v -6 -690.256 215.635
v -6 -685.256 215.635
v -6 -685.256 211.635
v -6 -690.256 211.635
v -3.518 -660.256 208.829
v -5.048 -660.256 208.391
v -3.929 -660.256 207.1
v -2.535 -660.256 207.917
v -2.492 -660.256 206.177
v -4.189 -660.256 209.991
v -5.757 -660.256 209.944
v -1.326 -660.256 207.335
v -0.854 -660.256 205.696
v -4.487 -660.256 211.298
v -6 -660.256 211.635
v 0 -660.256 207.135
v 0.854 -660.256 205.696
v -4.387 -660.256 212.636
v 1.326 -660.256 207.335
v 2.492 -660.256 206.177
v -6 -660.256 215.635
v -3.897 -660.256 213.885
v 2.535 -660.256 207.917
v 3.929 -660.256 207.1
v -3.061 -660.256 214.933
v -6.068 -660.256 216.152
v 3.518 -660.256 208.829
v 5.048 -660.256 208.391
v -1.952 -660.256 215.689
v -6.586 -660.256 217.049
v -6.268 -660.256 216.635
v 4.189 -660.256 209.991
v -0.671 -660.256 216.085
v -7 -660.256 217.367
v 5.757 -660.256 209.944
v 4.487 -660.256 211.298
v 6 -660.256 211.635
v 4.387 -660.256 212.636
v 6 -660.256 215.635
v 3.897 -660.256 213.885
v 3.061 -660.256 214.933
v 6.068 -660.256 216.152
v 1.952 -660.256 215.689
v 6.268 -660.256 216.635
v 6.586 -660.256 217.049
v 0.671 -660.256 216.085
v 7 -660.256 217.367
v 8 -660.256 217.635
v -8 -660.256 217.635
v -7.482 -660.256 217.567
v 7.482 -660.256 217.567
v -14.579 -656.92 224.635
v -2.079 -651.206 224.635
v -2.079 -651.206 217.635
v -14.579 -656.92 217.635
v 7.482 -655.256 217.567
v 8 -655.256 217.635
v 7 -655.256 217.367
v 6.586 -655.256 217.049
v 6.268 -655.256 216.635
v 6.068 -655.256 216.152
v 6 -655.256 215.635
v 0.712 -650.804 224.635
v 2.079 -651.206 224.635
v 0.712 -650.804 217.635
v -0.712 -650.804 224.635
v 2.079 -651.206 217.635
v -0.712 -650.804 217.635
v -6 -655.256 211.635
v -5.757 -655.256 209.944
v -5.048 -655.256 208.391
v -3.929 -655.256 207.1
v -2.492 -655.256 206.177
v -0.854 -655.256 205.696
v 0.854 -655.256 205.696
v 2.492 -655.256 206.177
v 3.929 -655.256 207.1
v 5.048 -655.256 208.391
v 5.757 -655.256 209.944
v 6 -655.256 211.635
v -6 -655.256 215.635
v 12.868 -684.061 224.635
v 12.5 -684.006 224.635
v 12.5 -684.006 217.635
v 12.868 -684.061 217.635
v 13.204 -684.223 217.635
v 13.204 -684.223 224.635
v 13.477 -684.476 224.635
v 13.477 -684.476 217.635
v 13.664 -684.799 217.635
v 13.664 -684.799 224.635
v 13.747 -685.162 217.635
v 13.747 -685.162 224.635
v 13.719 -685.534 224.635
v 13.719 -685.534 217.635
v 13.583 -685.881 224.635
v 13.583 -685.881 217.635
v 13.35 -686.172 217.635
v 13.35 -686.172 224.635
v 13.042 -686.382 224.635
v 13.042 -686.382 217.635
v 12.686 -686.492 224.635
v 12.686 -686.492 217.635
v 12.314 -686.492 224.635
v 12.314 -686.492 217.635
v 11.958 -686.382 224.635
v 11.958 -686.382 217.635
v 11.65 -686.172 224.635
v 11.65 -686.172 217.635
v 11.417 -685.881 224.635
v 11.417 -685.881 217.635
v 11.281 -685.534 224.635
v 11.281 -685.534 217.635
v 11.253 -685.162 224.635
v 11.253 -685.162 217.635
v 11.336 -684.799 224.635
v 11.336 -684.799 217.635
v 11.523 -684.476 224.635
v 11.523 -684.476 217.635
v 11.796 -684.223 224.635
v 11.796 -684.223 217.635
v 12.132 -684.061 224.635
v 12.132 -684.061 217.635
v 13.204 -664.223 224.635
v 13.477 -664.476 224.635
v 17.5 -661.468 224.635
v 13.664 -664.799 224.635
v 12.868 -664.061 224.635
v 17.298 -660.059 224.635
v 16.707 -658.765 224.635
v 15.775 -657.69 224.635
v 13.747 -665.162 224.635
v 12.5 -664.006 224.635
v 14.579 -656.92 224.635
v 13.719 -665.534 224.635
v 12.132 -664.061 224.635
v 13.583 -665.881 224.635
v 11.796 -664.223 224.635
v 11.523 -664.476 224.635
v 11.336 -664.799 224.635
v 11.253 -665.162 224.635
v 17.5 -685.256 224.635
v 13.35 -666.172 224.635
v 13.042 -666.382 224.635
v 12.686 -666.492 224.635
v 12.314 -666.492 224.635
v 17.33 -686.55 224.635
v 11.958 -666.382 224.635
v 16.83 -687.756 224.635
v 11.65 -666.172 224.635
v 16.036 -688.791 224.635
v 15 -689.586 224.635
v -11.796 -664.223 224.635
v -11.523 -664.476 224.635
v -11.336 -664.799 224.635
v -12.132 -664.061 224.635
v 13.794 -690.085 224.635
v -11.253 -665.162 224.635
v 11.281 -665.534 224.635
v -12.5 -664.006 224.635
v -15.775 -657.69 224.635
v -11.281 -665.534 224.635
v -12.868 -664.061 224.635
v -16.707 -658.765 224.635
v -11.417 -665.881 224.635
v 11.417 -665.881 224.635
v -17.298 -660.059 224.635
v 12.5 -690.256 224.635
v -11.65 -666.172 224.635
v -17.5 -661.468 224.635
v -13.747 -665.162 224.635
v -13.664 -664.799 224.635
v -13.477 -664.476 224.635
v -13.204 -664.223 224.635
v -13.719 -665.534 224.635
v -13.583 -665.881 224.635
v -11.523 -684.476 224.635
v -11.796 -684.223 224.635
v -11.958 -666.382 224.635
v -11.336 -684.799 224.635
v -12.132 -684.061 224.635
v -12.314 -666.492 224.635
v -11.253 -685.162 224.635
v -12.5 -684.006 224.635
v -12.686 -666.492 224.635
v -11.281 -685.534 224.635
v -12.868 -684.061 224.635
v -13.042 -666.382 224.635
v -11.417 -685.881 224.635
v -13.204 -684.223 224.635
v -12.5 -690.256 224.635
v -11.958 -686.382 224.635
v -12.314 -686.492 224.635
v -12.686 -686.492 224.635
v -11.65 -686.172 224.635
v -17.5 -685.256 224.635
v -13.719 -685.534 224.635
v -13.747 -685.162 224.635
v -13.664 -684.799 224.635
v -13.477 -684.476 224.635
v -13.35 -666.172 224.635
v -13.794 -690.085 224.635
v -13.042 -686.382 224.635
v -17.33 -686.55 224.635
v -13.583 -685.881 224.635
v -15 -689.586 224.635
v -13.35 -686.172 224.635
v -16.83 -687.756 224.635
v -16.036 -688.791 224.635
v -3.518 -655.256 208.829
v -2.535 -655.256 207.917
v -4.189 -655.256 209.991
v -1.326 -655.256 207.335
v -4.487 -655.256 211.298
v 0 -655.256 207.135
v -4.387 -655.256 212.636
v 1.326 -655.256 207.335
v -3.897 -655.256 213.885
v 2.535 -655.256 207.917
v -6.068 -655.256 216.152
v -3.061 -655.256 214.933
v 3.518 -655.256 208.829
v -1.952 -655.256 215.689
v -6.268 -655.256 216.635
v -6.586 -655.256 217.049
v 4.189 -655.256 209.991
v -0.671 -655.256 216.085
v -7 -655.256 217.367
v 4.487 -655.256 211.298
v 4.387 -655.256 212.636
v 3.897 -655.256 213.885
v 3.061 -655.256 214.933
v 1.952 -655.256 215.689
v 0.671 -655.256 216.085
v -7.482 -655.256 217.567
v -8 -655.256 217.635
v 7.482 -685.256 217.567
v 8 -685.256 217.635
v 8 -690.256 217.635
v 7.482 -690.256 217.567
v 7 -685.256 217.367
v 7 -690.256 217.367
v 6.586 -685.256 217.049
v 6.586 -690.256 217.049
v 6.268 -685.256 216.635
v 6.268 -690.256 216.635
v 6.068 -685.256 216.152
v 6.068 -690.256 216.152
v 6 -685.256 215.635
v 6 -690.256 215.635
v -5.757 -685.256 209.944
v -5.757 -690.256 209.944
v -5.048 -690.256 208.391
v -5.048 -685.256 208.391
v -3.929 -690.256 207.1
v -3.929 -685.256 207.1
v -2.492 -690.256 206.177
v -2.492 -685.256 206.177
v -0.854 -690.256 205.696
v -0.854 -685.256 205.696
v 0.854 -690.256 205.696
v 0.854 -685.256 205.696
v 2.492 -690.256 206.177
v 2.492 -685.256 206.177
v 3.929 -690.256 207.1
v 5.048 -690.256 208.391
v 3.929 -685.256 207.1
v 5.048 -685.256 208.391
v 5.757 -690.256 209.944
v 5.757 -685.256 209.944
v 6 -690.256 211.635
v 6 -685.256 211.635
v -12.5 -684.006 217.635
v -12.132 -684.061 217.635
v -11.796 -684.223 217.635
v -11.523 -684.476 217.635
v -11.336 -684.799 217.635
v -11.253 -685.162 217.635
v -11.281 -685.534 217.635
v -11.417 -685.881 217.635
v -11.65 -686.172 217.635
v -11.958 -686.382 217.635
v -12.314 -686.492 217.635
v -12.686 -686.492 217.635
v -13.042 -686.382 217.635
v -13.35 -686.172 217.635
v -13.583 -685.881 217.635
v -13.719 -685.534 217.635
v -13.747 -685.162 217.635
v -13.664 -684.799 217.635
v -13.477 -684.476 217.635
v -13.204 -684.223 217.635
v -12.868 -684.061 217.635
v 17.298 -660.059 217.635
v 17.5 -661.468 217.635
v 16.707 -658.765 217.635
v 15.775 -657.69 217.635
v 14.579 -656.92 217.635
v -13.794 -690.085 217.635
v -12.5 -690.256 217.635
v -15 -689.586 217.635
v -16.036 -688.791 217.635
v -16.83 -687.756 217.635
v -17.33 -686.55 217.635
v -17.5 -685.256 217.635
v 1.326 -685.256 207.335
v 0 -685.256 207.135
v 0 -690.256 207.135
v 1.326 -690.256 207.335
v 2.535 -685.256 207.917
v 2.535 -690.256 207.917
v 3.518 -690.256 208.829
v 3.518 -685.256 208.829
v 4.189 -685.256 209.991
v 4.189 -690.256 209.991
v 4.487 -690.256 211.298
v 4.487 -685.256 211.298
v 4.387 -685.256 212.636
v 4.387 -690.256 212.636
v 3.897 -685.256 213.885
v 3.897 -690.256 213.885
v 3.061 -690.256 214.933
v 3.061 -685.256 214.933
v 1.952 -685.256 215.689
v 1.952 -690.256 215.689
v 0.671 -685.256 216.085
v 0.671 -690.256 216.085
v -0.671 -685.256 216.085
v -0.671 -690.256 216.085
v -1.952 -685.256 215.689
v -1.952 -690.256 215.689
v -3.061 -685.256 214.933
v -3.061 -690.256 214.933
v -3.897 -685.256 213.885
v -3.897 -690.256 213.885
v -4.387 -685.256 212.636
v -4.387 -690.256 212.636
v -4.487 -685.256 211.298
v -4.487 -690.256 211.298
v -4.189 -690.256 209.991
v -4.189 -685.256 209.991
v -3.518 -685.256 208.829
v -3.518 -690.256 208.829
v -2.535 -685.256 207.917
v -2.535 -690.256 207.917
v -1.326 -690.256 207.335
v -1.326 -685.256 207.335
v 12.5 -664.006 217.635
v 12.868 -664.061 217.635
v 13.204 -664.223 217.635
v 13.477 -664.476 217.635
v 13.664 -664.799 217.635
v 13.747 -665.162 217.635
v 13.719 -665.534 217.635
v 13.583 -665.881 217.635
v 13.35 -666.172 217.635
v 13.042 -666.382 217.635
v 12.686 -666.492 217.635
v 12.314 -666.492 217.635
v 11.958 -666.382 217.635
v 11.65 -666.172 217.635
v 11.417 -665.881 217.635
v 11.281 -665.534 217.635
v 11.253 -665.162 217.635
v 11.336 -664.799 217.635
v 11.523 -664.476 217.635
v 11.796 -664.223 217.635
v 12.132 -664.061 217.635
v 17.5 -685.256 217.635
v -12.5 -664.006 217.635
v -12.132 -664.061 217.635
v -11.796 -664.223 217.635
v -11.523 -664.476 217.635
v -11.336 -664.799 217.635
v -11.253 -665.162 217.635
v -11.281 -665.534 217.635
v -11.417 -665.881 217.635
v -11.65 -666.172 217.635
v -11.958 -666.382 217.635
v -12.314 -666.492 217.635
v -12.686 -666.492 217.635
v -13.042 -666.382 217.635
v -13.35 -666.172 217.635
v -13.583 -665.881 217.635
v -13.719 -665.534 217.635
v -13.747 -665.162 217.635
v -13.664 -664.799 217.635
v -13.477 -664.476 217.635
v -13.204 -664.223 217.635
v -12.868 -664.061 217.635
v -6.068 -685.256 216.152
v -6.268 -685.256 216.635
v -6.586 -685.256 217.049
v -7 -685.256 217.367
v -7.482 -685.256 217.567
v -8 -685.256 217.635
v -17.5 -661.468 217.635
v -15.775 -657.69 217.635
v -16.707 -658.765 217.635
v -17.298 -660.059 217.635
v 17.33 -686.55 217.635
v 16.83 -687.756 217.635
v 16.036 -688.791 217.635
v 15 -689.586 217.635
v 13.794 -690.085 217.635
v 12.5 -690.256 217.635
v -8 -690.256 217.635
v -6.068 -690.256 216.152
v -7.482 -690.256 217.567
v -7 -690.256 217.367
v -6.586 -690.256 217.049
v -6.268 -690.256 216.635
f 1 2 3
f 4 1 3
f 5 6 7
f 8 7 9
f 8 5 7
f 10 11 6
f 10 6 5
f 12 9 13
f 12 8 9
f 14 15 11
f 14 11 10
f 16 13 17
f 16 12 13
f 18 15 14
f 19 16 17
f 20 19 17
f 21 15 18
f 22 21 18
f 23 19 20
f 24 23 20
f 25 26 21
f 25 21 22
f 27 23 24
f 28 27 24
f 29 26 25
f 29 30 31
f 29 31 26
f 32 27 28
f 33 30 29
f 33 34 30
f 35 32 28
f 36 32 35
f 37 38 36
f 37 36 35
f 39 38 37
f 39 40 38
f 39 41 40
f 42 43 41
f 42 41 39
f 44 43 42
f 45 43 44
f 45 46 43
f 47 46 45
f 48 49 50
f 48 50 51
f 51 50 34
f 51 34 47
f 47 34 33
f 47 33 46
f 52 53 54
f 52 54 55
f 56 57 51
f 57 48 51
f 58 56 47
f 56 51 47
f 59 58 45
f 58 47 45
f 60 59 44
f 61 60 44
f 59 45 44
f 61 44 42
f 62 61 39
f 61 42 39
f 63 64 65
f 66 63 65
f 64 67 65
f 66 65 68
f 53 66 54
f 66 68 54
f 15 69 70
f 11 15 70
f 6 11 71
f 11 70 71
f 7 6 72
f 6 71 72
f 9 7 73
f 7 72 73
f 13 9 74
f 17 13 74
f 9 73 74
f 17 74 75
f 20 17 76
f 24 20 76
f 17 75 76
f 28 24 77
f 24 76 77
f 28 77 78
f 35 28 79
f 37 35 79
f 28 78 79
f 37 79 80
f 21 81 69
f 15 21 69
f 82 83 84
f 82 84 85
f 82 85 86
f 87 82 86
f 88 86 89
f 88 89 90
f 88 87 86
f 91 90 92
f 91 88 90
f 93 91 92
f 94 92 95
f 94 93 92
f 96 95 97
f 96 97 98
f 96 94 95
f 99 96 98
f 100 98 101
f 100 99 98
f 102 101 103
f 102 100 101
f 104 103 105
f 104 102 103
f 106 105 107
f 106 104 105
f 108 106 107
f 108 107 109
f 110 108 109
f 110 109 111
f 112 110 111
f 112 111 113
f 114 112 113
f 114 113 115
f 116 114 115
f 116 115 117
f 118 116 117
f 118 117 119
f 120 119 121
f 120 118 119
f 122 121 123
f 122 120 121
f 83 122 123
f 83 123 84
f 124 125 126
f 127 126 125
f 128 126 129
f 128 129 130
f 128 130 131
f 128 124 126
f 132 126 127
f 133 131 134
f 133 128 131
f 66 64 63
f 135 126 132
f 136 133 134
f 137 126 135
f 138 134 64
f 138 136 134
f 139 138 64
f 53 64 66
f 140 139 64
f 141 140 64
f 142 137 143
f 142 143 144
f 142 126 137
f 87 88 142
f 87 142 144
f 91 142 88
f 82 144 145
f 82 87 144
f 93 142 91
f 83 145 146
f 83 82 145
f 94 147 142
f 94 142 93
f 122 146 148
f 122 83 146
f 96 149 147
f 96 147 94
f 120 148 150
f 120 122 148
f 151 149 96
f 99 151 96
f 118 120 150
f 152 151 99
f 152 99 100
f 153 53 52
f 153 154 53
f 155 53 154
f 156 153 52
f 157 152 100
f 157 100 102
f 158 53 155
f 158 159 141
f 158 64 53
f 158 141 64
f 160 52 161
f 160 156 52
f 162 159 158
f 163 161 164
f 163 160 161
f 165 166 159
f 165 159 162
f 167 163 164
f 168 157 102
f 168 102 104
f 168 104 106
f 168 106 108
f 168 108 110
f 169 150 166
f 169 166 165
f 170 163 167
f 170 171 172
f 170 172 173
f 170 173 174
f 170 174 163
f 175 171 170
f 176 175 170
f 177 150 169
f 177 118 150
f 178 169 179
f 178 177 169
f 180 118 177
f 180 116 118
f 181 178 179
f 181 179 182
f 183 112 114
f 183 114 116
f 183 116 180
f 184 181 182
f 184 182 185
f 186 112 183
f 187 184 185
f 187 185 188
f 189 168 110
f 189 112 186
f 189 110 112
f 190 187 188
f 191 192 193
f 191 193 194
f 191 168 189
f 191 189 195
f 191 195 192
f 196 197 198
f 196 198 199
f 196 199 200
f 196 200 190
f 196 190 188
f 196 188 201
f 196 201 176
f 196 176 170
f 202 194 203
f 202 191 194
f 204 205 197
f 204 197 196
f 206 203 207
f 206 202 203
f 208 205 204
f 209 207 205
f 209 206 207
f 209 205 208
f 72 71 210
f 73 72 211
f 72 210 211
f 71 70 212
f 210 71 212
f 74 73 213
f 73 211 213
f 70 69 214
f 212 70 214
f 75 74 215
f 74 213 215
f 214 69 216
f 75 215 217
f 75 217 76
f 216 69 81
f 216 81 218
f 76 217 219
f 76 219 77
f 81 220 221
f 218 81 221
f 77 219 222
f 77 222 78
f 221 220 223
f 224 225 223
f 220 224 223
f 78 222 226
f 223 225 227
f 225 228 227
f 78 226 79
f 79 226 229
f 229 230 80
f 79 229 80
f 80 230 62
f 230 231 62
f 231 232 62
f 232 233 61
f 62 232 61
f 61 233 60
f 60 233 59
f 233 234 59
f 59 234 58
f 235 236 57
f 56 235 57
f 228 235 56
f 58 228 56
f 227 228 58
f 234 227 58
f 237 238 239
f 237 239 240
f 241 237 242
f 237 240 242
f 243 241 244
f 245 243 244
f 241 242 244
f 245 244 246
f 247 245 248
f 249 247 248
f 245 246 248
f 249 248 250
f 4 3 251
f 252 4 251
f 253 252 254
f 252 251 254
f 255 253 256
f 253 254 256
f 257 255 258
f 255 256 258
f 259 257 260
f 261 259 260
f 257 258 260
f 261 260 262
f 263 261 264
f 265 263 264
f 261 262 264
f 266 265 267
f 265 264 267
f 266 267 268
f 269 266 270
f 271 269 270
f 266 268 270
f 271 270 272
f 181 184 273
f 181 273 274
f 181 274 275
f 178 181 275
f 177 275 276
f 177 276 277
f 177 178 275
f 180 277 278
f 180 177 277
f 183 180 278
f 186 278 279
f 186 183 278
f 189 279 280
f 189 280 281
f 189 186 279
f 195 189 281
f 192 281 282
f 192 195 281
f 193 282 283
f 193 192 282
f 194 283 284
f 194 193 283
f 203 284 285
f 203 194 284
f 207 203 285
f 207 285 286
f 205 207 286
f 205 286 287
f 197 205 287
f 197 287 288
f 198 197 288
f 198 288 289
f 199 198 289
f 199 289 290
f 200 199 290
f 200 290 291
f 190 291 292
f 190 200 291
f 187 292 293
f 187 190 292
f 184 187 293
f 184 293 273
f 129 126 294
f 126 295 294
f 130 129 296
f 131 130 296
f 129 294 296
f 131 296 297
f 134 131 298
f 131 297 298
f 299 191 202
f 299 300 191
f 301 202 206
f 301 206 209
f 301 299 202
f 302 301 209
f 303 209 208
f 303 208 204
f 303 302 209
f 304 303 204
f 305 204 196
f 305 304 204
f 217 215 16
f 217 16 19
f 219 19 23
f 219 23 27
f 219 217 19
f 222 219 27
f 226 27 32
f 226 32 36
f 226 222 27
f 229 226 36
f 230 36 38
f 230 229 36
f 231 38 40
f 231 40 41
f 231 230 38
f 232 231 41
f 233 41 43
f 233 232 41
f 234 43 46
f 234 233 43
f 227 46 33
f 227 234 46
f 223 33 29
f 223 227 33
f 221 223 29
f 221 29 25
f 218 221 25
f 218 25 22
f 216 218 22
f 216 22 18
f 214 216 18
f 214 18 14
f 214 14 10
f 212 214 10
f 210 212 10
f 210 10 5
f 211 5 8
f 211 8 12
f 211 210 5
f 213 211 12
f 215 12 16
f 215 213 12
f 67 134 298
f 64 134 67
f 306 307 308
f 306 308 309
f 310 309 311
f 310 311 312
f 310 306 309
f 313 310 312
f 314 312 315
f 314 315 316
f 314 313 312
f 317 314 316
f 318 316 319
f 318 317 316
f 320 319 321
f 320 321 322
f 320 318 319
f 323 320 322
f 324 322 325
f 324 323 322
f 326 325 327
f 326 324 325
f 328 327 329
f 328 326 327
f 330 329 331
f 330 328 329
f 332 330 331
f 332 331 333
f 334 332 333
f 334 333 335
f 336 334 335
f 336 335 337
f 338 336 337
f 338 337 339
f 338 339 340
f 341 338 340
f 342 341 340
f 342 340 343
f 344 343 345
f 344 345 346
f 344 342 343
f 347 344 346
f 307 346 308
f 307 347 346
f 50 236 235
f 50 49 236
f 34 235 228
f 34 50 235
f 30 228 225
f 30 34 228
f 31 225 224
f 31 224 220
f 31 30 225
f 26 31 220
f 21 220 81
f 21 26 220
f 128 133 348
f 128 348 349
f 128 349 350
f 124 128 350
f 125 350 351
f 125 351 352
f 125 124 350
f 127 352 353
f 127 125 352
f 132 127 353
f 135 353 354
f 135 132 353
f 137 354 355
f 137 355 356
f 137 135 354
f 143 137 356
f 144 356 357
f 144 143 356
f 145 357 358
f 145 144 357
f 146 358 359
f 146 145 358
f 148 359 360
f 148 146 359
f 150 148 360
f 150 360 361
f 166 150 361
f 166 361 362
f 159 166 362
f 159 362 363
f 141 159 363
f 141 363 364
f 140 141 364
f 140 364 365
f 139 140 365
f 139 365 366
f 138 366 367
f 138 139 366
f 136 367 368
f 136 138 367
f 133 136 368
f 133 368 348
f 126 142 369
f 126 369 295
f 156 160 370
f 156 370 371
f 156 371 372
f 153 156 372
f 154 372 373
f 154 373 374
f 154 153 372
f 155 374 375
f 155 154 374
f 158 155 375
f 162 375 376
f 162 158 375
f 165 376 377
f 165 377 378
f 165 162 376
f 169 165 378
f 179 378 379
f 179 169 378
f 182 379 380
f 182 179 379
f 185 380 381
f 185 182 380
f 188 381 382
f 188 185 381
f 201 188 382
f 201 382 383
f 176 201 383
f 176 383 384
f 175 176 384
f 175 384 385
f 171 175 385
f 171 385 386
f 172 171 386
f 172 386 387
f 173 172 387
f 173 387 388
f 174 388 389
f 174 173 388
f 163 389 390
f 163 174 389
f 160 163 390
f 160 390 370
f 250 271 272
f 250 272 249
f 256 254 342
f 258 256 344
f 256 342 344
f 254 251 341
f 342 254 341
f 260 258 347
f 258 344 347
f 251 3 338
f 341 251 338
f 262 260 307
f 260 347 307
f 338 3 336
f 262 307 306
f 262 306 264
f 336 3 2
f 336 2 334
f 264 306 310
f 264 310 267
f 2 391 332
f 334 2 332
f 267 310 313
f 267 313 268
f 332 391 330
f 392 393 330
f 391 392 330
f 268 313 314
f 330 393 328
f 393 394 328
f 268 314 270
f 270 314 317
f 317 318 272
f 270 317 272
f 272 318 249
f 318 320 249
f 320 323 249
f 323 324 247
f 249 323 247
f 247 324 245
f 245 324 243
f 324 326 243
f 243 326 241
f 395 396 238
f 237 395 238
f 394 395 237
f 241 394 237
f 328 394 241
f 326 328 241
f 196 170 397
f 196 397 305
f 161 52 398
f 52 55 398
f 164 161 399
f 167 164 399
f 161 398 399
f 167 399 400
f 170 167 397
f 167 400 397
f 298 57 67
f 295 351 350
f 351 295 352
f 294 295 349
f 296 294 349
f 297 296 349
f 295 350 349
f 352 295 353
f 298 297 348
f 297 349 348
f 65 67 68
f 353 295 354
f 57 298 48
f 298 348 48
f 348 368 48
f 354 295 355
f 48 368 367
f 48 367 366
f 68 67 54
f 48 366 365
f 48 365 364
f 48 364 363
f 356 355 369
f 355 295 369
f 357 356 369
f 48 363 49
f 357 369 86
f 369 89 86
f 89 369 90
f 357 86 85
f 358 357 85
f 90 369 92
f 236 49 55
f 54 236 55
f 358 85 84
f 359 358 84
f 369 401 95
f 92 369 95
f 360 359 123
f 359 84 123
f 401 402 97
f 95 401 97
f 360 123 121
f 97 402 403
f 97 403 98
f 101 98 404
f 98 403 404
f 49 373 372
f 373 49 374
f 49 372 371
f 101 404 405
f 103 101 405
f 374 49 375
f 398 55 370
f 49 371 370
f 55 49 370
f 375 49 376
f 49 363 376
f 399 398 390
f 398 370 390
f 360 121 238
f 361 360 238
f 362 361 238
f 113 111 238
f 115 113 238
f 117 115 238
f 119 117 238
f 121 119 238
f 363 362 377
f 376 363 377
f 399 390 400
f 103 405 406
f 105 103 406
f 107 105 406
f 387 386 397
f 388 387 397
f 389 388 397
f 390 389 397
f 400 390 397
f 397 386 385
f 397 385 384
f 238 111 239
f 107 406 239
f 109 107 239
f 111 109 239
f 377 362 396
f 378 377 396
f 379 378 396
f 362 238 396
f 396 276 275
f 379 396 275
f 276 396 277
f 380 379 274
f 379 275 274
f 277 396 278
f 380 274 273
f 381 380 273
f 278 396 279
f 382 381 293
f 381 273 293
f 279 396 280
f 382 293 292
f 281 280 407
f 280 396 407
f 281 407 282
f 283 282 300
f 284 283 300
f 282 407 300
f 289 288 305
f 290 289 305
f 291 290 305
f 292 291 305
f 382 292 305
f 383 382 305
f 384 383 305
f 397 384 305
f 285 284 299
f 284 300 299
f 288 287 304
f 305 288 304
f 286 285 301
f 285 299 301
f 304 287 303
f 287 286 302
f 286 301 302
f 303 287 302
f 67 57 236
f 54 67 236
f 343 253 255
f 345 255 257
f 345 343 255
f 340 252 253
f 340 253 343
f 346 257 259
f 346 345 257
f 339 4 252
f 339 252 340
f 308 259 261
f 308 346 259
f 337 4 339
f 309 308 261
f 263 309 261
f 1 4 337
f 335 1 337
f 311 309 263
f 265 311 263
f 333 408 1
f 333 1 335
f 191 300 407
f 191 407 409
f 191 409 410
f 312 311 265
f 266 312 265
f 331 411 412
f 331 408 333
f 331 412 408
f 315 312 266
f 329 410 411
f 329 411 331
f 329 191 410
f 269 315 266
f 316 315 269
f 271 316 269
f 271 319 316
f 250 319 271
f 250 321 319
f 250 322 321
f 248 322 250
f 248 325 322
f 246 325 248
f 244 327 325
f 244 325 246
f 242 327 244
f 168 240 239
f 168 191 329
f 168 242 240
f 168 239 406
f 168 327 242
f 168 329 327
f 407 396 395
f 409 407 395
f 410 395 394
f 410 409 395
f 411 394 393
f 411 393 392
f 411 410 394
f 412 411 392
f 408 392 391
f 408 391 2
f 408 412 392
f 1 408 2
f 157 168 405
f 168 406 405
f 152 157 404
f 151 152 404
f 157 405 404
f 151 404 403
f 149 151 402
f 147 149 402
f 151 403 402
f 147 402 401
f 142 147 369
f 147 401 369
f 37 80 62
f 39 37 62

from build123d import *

# Parameters (mm, degrees)
SKETCH1_R           = 1.25
BOSS_EXTRUDE1_DEPTH = 7
SKETCH2_R           = 4.5
BOSS_EXTRUDE2_DEPTH = 5
SKETCH3_R           = 4.5
BOSS_EXTRUDE3_DEPTH = 5
FILLET1_R           = 2
FILLET2_R           = 5


with BuildPart() as part:
    # Sketch1 → Boss-Extrude1 (new body)
    with BuildSketch(Plane(origin=(0, -692.732289503, 224.634763615), x_dir=(1, 0, 0), z_dir=(0, 0, -1))):
        Polygon((17.5, -2.476720525), (17.5, -34.476720525), (0, -42.476720525), (-17.5, -34.476720525), (-17.5, -2.476720525), align=None)
        with Locations(Location((-12.5, -27.476720525, 0), (0, 0, 270))):
            Circle(SKETCH1_R, mode=Mode.SUBTRACT)
        with Locations(Location((12.5, -27.476720525, 0), (0, 0, 270))):
            Circle(SKETCH1_R, mode=Mode.SUBTRACT)
        with Locations(Location((12.5, -7.476720525, 0), (0, 0, 270))):
            Circle(SKETCH1_R, mode=Mode.SUBTRACT)
        with Locations(Location((-12.5, -7.476720525, 0), (0, 0, 270))):
            Circle(SKETCH1_R, mode=Mode.SUBTRACT)
    extrude(amount=BOSS_EXTRUDE1_DEPTH)

    # Sketch2 → Boss-Extrude2 (add)
    with BuildSketch(Plane.XZ.offset(655.255568978)):
        with BuildLine():
            Line((6, 217.634763615), (-6, 217.634763615))
            Line((-6, 217.634763615), (-6, 211.634763615))
            ThreePointArc((-6, 211.634763615), (0, 205.634763615), (6, 211.634763615))
            Line((6, 211.634763615), (6, 217.634763615))
        make_face()
        with Locations(Location((0, 211.634763615, 0), (0, 0, 270))):
            Circle(SKETCH2_R, mode=Mode.SUBTRACT)
    extrude(amount=BOSS_EXTRUDE2_DEPTH)

    # Sketch3 → Boss-Extrude3 (add)
    with BuildSketch(Plane.XZ.offset(685.255568978)):
        with BuildLine():
            Line((6, 217.634763615), (-6, 217.634763615))
            Line((-6, 217.634763615), (-6, 211.634763615))
            ThreePointArc((-6, 211.634763615), (0, 205.634763615), (6, 211.634763615))
            Line((6, 211.634763615), (6, 217.634763615))
        make_face()
        with Locations(Location((0, 211.634763615, 0), (0, 0, 270))):
            Circle(SKETCH3_R, mode=Mode.SUBTRACT)
    extrude(amount=BOSS_EXTRUDE3_DEPTH)

    # Fillet1
    fillet1_edges = [part.edges().sort_by_distance(p)[0] for p in [
        (6, -657.755568978, 217.634763615),
        (-6, -657.755568978, 217.634763615),
        (6, -687.755568978, 217.634763615),
        (-6, -687.755568978, 217.634763615),
    ]]
    fillet(fillet1_edges, radius=FILLET1_R)

    # Fillet2
    fillet2_edges = [part.edges().sort_by_distance(p)[0] for p in [
        (17.5, -690.255568978, 221.134763615),
        (17.5, -658.255568978, 221.134763615),
        (0, -650.255568978, 221.134763615),
        (-17.5, -658.255568978, 221.134763615),
        (-17.5, -690.255568978, 221.134763615),
    ]]
    fillet(fillet2_edges, radius=FILLET2_R)


solid = part.part
